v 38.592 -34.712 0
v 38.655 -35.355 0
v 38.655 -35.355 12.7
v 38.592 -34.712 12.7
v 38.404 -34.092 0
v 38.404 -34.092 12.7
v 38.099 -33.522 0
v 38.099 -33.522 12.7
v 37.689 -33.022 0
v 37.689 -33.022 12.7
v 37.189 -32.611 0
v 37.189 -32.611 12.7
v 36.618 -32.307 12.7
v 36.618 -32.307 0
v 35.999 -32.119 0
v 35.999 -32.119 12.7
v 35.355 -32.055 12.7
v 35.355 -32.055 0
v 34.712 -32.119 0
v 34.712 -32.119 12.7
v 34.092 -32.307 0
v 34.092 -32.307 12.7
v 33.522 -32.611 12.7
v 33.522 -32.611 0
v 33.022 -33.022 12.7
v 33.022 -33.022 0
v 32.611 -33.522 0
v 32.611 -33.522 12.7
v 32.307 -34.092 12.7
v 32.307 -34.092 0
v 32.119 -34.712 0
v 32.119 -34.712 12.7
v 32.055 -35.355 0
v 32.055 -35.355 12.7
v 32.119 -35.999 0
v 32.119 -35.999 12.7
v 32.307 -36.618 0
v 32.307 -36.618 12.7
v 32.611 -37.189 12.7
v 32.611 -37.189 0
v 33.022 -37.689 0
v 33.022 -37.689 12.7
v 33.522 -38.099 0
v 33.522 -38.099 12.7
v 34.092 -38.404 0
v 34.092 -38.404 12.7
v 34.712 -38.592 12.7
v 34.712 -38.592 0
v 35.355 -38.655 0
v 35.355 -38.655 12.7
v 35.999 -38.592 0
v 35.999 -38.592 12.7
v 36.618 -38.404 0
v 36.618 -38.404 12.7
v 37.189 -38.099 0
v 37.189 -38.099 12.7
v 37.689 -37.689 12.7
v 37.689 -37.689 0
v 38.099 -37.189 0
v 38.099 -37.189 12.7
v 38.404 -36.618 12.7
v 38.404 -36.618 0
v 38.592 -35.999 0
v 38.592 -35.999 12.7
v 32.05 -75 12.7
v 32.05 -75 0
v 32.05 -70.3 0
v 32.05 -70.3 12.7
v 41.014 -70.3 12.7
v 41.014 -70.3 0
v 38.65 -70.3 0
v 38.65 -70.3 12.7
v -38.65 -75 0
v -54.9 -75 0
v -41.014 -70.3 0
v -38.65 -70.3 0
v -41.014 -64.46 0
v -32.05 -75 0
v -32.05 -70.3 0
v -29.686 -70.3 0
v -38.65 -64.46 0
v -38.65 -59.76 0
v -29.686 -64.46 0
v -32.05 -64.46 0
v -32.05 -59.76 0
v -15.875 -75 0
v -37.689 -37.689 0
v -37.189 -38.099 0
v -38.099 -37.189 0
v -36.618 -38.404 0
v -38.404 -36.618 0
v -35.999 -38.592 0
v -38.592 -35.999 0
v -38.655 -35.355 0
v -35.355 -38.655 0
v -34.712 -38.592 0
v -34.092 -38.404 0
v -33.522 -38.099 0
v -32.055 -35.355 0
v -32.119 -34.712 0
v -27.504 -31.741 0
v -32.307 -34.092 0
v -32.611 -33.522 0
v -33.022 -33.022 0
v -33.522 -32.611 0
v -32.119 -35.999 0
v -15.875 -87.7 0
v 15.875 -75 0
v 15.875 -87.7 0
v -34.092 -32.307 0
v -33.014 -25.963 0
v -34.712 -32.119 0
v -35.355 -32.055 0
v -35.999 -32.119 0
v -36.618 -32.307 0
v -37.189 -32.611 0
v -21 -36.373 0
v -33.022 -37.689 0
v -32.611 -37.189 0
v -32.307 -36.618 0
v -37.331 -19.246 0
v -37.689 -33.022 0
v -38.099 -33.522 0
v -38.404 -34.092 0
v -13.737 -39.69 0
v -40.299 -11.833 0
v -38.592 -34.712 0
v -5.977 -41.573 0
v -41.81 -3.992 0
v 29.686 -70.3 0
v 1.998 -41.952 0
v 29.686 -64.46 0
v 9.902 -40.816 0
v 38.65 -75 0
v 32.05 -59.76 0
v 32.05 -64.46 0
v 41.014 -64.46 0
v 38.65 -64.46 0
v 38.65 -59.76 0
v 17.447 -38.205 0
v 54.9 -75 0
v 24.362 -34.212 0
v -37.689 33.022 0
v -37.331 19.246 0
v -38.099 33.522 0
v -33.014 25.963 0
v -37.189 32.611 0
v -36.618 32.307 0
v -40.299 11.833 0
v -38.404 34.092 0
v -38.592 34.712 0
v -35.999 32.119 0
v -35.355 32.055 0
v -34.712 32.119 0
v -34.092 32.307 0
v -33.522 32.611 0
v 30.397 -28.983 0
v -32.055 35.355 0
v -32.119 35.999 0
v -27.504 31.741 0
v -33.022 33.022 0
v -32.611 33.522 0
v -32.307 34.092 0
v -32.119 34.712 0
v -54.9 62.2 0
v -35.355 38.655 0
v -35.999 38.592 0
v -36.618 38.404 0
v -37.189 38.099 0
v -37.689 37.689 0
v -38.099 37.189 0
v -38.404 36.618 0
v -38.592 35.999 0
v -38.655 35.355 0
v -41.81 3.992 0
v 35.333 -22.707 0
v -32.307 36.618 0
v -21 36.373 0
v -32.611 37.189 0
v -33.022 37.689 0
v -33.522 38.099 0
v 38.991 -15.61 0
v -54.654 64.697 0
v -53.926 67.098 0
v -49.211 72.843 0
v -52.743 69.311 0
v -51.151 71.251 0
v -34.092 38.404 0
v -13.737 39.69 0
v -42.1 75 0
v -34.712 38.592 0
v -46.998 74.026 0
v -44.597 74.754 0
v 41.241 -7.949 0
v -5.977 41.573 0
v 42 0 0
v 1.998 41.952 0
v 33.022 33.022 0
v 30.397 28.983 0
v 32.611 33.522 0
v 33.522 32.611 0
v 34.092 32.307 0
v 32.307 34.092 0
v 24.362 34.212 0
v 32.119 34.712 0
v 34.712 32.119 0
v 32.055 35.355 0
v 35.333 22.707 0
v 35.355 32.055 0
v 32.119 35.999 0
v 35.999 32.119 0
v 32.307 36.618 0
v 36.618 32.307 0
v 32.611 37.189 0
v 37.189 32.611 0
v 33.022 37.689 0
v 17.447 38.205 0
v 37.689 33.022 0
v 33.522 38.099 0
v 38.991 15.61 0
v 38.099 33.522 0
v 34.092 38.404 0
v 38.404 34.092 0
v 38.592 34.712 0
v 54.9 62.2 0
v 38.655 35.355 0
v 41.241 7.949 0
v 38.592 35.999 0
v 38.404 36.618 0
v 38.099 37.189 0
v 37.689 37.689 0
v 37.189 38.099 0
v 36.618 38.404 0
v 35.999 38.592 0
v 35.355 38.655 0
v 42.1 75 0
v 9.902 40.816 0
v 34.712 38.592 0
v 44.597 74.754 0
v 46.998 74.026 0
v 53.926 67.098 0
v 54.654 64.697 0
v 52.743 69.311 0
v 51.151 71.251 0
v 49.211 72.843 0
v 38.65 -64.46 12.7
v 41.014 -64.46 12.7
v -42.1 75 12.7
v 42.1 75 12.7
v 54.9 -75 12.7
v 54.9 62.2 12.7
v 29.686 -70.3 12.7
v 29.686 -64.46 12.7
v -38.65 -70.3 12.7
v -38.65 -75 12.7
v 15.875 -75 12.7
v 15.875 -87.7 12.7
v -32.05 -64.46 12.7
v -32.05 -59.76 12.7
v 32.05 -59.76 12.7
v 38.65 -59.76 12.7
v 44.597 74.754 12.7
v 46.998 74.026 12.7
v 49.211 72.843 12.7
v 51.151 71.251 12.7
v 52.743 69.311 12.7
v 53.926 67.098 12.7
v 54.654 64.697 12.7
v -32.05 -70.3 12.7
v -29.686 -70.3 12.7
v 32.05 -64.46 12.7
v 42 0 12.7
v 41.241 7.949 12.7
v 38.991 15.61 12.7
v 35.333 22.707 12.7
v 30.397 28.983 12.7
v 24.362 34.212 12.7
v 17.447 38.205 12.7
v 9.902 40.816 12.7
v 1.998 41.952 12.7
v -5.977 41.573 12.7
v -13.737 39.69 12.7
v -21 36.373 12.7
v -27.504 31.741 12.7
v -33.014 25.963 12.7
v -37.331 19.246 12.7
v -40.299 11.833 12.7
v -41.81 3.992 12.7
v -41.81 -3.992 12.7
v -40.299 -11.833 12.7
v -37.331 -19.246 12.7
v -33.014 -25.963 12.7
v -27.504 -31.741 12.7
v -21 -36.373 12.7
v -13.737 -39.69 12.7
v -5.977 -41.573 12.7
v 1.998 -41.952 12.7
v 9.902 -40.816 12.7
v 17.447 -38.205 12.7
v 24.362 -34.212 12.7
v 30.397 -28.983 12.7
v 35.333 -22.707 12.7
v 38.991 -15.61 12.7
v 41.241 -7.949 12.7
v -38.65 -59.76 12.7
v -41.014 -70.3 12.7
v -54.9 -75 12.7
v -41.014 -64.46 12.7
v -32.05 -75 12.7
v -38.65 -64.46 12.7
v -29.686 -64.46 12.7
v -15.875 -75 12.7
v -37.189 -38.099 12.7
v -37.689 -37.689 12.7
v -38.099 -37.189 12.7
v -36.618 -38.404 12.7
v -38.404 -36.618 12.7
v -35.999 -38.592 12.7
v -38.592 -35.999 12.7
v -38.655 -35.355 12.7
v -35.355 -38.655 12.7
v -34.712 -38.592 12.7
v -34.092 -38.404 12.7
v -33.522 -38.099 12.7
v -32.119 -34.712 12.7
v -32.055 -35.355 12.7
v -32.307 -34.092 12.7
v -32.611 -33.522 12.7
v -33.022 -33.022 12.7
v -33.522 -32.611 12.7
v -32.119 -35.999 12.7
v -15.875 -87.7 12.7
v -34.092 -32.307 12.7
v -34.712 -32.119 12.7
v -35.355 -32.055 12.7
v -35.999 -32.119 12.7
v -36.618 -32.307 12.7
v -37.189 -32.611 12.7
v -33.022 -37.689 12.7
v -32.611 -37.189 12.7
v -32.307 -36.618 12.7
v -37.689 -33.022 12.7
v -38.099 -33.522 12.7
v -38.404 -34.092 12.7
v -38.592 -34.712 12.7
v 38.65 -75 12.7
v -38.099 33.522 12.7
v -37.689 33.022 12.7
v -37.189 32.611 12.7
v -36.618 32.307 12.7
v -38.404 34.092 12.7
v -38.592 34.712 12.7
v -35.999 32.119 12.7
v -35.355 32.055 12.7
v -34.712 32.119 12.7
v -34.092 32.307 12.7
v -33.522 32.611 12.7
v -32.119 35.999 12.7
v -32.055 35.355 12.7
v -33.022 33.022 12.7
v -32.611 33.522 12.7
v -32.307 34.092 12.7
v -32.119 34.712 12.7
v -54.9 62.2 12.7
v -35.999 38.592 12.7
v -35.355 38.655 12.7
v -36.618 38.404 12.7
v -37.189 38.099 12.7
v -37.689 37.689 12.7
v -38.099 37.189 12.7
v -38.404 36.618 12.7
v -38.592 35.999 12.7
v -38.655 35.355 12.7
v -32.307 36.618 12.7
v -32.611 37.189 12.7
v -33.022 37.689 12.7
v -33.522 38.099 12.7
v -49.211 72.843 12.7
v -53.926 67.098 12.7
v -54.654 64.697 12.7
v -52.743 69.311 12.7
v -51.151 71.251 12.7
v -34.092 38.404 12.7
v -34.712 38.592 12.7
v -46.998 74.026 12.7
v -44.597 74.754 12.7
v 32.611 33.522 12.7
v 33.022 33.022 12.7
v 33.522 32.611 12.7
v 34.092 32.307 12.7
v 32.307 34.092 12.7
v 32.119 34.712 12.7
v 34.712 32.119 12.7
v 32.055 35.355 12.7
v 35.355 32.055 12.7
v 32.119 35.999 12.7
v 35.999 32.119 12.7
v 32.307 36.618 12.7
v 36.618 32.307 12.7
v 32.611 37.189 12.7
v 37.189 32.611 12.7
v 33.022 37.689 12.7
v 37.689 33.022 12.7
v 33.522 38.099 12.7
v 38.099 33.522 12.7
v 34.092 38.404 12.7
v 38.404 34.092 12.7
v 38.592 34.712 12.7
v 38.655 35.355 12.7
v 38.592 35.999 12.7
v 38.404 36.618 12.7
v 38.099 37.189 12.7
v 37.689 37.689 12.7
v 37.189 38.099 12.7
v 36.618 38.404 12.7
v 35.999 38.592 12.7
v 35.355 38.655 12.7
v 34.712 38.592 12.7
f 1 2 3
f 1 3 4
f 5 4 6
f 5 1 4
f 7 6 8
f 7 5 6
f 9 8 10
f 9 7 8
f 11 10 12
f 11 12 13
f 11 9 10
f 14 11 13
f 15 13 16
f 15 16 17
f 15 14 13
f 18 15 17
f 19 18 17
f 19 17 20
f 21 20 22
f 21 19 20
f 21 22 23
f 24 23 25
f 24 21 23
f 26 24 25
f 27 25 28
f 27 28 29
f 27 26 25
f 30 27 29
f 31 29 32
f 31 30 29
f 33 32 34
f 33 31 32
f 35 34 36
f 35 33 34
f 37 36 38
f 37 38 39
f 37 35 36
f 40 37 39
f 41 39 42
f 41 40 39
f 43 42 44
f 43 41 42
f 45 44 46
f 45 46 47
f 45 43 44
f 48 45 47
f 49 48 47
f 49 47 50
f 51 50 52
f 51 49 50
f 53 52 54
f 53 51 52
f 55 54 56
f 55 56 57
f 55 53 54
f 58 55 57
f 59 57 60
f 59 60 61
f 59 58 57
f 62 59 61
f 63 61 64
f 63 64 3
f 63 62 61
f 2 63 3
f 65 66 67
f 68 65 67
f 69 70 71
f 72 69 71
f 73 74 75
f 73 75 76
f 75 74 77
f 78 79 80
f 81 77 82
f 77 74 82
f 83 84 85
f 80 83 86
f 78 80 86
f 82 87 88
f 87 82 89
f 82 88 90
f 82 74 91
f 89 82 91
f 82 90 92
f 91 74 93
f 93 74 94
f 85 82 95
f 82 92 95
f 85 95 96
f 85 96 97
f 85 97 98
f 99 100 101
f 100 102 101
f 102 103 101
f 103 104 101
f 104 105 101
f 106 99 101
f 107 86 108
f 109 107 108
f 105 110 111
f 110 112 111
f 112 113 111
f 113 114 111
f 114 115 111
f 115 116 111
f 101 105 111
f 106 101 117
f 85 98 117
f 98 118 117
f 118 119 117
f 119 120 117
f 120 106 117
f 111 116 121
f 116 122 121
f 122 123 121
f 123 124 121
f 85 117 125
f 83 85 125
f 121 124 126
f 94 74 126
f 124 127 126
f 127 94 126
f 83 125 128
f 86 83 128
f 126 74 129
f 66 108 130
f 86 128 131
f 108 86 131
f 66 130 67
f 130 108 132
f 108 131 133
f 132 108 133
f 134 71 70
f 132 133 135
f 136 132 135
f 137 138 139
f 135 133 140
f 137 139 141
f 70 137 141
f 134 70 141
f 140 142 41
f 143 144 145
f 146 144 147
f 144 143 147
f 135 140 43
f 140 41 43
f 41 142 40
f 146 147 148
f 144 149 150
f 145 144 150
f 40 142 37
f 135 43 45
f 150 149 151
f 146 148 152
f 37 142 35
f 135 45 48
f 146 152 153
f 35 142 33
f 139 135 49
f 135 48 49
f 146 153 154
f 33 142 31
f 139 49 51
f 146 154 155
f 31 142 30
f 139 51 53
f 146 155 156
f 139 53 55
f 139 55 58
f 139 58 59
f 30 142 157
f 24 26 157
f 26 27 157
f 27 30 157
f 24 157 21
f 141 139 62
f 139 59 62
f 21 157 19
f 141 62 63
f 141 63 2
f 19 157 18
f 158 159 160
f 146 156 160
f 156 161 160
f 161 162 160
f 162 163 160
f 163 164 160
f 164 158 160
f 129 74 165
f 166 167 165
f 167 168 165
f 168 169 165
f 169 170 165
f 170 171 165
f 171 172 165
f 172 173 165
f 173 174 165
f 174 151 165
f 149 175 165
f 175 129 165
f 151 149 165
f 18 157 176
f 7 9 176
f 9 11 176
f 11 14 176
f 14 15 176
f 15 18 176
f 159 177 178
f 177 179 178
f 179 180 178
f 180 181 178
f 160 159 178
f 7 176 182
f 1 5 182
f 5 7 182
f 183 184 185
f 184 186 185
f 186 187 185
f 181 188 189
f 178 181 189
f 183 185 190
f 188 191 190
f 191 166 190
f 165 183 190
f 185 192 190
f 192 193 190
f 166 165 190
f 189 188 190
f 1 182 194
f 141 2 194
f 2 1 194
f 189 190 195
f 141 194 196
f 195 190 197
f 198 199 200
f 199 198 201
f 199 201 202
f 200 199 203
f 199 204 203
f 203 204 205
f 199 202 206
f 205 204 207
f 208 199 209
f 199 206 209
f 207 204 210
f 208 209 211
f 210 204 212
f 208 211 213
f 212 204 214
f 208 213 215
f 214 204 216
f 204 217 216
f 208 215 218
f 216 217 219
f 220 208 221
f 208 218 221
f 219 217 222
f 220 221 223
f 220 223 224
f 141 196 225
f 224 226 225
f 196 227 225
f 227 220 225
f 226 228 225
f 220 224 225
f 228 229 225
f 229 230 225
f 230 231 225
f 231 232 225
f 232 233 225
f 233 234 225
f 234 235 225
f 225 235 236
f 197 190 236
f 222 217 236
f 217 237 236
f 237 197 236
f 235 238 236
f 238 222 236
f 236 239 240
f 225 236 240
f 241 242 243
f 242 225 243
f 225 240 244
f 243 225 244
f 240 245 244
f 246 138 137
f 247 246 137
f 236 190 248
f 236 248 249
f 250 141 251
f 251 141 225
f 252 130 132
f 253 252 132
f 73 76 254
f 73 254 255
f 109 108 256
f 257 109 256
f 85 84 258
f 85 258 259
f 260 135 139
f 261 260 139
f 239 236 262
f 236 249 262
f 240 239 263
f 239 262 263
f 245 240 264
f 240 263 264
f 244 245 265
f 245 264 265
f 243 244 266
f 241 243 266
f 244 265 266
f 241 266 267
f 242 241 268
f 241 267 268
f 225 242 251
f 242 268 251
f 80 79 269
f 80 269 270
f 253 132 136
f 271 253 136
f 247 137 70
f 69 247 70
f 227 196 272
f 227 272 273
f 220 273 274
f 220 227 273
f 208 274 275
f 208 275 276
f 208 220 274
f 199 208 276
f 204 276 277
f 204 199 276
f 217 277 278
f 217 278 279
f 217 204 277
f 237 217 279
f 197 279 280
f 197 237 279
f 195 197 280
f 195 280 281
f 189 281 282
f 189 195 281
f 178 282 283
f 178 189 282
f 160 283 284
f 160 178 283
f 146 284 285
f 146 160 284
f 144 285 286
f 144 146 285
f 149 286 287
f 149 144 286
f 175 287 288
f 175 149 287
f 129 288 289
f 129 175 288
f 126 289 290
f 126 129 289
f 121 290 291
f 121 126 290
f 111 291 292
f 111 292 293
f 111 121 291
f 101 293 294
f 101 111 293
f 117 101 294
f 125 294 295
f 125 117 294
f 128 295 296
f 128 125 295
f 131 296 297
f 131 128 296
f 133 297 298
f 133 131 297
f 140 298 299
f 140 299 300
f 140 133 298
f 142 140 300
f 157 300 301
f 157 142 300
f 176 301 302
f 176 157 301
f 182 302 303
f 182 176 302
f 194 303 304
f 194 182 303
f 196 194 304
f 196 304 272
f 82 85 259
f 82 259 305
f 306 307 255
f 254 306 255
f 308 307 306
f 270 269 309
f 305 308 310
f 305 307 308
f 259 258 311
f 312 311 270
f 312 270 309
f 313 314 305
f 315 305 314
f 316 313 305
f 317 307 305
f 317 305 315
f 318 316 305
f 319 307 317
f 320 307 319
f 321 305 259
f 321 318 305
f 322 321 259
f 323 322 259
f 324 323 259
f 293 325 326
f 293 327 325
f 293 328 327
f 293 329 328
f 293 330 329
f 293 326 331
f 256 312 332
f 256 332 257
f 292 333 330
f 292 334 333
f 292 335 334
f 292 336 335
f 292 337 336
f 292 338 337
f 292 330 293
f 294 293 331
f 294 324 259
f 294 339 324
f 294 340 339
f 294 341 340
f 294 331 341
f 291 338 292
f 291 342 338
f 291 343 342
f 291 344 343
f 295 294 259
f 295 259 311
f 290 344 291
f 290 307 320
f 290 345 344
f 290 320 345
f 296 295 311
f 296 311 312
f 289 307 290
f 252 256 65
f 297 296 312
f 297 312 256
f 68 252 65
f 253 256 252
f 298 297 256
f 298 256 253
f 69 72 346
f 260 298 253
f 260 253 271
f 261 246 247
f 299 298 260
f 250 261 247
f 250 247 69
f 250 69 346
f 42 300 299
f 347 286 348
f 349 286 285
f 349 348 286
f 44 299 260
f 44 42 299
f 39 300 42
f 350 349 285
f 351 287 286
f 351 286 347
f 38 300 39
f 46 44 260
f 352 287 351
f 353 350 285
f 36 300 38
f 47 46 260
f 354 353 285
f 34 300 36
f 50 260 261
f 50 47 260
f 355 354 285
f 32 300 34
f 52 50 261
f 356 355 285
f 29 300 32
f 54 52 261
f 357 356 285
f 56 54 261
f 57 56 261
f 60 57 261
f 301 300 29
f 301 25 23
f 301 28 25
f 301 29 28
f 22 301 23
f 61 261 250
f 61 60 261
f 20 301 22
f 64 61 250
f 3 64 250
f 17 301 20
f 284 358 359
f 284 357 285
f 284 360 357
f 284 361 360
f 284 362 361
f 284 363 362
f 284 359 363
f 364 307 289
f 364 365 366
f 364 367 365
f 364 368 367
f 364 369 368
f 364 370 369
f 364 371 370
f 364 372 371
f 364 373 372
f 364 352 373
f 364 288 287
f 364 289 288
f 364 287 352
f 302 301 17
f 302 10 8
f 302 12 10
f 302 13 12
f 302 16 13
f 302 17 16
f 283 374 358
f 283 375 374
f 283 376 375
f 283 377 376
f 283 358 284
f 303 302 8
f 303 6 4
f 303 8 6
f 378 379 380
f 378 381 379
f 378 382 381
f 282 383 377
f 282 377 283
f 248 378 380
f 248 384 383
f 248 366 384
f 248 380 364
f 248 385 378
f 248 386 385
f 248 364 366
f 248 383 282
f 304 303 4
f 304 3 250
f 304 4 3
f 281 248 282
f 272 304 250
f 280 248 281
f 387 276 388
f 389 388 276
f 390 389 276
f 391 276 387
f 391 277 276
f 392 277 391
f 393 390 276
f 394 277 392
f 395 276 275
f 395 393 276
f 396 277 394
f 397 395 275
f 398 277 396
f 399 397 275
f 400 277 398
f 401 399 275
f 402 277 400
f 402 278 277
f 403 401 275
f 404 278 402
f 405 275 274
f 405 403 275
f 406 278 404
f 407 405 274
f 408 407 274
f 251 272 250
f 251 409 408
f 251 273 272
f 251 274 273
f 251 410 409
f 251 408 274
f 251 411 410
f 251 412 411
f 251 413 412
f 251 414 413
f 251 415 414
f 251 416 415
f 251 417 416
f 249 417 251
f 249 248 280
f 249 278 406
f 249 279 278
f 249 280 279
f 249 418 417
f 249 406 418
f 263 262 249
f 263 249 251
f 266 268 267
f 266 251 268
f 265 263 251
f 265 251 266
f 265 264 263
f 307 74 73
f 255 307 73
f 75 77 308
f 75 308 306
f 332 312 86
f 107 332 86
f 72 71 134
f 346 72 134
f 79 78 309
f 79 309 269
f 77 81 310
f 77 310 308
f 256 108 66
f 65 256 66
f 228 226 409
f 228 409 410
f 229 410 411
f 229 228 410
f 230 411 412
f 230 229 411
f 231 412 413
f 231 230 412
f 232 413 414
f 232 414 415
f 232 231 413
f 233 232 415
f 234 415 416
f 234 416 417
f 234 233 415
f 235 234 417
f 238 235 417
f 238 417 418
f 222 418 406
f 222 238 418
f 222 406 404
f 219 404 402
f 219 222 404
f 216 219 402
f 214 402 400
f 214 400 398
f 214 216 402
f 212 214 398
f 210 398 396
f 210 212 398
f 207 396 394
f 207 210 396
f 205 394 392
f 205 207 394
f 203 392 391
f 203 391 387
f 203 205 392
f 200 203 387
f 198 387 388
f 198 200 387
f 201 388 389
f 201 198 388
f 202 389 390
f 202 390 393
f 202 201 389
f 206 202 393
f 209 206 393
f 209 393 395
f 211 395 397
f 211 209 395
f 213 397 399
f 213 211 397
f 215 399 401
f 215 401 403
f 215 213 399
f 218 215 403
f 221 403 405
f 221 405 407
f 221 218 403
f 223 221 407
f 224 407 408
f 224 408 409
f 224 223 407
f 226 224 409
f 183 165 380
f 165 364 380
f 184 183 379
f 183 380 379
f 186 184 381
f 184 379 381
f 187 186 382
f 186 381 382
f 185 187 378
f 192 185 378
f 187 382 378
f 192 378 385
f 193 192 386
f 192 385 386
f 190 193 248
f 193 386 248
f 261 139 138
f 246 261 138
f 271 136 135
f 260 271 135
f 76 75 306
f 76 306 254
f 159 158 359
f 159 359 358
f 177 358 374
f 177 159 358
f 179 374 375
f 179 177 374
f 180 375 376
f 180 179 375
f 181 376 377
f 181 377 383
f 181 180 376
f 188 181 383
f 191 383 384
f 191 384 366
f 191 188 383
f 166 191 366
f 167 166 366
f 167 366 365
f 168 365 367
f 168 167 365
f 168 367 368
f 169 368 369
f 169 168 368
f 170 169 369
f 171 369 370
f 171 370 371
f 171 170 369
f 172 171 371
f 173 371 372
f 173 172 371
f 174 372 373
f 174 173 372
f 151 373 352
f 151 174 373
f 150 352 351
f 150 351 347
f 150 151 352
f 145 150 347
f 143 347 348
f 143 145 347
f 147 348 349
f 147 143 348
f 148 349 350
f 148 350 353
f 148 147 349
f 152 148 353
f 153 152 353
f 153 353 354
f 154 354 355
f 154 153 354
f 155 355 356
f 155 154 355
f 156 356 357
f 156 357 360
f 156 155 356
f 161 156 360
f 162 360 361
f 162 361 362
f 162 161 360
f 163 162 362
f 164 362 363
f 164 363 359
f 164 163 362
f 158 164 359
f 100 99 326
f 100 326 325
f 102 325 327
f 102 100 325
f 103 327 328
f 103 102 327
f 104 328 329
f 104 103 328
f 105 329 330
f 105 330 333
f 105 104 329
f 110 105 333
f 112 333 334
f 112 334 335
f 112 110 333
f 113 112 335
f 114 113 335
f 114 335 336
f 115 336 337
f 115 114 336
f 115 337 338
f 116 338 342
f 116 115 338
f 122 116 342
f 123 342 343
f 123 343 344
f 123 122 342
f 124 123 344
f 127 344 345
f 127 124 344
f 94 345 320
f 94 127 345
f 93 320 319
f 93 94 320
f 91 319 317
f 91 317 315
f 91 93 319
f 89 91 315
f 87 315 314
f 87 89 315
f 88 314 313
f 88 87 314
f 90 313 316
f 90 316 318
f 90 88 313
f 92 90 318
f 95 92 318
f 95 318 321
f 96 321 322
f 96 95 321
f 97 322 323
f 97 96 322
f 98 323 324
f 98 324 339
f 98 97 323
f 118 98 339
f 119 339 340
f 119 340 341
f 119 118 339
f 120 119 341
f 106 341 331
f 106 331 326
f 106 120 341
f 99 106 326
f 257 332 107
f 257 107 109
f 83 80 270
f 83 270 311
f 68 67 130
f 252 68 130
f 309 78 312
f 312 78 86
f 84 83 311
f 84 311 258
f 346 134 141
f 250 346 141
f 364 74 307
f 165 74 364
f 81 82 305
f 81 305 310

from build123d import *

# Parameters (mm, degrees)
SKETCH1_W           = 109.8
SKETCH1_H           = 150
SKETCH1_R           = 42
SKETCH1_R_2         = 3.3
BOSS_EXTRUDE1_DEPTH = 12.7
CUT_EXTRUDE1_DEPTH  = 94.809914188
BOSS_EXTRUDE2_DEPTH = 12.7
FILLET1_R           = 12.8


with BuildPart() as part:
    # Sketch1 → Boss-Extrude1 (new body)
    with BuildSketch(Plane.XY):
        Rectangle(SKETCH1_W, SKETCH1_H)
        Circle(SKETCH1_R, mode=Mode.SUBTRACT)
        with Locations((-35.355339059, 35.355339059)):
            Circle(SKETCH1_R_2, mode=Mode.SUBTRACT)
        with Locations((35.355339059, 35.355339059)):
            Circle(SKETCH1_R_2, mode=Mode.SUBTRACT)
        with Locations((35.355339059, -35.355339059)):
            Circle(SKETCH1_R_2, mode=Mode.SUBTRACT)
        with Locations((-35.355339059, -35.355339059)):
            Circle(SKETCH1_R_2, mode=Mode.SUBTRACT)
    extrude(amount=BOSS_EXTRUDE1_DEPTH)

    # Sketch2 → Cut-Extrude1 (cut, through all)
    with BuildSketch(Plane(origin=(0, 0, 0), x_dir=(-1, 0, 0), z_dir=(0, 0, -1))):
        Polygon((-38.65, -75), (-32.05, -75), (-32.05, -70.3), (-29.686, -70.3), (-29.686, -64.46), (-32.05, -64.46), (-32.05, -59.76), (-38.65, -59.76), (-38.65, -64.46), (-41.014, -64.46), (-41.014, -70.3), (-38.65, -70.3), align=None)
        Polygon((32.05, -75), (32.05, -70.3), (29.686, -70.3), (29.686, -64.46), (32.05, -64.46), (32.05, -59.76), (38.65, -59.76), (38.65, -64.46), (41.014, -64.46), (41.014, -70.3), (38.65, -70.3), (38.65, -75), align=None)
    extrude(amount=-CUT_EXTRUDE1_DEPTH, mode=Mode.SUBTRACT)

    # Sketch4 → Boss-Extrude2 (add)
    with BuildSketch(Plane.XZ.offset(75)):
        Polygon((0, 0), (15.875, 0), (15.875, 12.7), (-15.875, 12.7), (-15.875, 0), align=None)
    extrude(amount=BOSS_EXTRUDE2_DEPTH)

    # Fillet1
    fillet1_edges = [part.edges().sort_by_distance(p)[0] for p in [
        (-54.9, 75, 6.35),
        (54.9, 75, 6.35),
    ]]
    fillet(fillet1_edges, radius=FILLET1_R)


solid = part.part
